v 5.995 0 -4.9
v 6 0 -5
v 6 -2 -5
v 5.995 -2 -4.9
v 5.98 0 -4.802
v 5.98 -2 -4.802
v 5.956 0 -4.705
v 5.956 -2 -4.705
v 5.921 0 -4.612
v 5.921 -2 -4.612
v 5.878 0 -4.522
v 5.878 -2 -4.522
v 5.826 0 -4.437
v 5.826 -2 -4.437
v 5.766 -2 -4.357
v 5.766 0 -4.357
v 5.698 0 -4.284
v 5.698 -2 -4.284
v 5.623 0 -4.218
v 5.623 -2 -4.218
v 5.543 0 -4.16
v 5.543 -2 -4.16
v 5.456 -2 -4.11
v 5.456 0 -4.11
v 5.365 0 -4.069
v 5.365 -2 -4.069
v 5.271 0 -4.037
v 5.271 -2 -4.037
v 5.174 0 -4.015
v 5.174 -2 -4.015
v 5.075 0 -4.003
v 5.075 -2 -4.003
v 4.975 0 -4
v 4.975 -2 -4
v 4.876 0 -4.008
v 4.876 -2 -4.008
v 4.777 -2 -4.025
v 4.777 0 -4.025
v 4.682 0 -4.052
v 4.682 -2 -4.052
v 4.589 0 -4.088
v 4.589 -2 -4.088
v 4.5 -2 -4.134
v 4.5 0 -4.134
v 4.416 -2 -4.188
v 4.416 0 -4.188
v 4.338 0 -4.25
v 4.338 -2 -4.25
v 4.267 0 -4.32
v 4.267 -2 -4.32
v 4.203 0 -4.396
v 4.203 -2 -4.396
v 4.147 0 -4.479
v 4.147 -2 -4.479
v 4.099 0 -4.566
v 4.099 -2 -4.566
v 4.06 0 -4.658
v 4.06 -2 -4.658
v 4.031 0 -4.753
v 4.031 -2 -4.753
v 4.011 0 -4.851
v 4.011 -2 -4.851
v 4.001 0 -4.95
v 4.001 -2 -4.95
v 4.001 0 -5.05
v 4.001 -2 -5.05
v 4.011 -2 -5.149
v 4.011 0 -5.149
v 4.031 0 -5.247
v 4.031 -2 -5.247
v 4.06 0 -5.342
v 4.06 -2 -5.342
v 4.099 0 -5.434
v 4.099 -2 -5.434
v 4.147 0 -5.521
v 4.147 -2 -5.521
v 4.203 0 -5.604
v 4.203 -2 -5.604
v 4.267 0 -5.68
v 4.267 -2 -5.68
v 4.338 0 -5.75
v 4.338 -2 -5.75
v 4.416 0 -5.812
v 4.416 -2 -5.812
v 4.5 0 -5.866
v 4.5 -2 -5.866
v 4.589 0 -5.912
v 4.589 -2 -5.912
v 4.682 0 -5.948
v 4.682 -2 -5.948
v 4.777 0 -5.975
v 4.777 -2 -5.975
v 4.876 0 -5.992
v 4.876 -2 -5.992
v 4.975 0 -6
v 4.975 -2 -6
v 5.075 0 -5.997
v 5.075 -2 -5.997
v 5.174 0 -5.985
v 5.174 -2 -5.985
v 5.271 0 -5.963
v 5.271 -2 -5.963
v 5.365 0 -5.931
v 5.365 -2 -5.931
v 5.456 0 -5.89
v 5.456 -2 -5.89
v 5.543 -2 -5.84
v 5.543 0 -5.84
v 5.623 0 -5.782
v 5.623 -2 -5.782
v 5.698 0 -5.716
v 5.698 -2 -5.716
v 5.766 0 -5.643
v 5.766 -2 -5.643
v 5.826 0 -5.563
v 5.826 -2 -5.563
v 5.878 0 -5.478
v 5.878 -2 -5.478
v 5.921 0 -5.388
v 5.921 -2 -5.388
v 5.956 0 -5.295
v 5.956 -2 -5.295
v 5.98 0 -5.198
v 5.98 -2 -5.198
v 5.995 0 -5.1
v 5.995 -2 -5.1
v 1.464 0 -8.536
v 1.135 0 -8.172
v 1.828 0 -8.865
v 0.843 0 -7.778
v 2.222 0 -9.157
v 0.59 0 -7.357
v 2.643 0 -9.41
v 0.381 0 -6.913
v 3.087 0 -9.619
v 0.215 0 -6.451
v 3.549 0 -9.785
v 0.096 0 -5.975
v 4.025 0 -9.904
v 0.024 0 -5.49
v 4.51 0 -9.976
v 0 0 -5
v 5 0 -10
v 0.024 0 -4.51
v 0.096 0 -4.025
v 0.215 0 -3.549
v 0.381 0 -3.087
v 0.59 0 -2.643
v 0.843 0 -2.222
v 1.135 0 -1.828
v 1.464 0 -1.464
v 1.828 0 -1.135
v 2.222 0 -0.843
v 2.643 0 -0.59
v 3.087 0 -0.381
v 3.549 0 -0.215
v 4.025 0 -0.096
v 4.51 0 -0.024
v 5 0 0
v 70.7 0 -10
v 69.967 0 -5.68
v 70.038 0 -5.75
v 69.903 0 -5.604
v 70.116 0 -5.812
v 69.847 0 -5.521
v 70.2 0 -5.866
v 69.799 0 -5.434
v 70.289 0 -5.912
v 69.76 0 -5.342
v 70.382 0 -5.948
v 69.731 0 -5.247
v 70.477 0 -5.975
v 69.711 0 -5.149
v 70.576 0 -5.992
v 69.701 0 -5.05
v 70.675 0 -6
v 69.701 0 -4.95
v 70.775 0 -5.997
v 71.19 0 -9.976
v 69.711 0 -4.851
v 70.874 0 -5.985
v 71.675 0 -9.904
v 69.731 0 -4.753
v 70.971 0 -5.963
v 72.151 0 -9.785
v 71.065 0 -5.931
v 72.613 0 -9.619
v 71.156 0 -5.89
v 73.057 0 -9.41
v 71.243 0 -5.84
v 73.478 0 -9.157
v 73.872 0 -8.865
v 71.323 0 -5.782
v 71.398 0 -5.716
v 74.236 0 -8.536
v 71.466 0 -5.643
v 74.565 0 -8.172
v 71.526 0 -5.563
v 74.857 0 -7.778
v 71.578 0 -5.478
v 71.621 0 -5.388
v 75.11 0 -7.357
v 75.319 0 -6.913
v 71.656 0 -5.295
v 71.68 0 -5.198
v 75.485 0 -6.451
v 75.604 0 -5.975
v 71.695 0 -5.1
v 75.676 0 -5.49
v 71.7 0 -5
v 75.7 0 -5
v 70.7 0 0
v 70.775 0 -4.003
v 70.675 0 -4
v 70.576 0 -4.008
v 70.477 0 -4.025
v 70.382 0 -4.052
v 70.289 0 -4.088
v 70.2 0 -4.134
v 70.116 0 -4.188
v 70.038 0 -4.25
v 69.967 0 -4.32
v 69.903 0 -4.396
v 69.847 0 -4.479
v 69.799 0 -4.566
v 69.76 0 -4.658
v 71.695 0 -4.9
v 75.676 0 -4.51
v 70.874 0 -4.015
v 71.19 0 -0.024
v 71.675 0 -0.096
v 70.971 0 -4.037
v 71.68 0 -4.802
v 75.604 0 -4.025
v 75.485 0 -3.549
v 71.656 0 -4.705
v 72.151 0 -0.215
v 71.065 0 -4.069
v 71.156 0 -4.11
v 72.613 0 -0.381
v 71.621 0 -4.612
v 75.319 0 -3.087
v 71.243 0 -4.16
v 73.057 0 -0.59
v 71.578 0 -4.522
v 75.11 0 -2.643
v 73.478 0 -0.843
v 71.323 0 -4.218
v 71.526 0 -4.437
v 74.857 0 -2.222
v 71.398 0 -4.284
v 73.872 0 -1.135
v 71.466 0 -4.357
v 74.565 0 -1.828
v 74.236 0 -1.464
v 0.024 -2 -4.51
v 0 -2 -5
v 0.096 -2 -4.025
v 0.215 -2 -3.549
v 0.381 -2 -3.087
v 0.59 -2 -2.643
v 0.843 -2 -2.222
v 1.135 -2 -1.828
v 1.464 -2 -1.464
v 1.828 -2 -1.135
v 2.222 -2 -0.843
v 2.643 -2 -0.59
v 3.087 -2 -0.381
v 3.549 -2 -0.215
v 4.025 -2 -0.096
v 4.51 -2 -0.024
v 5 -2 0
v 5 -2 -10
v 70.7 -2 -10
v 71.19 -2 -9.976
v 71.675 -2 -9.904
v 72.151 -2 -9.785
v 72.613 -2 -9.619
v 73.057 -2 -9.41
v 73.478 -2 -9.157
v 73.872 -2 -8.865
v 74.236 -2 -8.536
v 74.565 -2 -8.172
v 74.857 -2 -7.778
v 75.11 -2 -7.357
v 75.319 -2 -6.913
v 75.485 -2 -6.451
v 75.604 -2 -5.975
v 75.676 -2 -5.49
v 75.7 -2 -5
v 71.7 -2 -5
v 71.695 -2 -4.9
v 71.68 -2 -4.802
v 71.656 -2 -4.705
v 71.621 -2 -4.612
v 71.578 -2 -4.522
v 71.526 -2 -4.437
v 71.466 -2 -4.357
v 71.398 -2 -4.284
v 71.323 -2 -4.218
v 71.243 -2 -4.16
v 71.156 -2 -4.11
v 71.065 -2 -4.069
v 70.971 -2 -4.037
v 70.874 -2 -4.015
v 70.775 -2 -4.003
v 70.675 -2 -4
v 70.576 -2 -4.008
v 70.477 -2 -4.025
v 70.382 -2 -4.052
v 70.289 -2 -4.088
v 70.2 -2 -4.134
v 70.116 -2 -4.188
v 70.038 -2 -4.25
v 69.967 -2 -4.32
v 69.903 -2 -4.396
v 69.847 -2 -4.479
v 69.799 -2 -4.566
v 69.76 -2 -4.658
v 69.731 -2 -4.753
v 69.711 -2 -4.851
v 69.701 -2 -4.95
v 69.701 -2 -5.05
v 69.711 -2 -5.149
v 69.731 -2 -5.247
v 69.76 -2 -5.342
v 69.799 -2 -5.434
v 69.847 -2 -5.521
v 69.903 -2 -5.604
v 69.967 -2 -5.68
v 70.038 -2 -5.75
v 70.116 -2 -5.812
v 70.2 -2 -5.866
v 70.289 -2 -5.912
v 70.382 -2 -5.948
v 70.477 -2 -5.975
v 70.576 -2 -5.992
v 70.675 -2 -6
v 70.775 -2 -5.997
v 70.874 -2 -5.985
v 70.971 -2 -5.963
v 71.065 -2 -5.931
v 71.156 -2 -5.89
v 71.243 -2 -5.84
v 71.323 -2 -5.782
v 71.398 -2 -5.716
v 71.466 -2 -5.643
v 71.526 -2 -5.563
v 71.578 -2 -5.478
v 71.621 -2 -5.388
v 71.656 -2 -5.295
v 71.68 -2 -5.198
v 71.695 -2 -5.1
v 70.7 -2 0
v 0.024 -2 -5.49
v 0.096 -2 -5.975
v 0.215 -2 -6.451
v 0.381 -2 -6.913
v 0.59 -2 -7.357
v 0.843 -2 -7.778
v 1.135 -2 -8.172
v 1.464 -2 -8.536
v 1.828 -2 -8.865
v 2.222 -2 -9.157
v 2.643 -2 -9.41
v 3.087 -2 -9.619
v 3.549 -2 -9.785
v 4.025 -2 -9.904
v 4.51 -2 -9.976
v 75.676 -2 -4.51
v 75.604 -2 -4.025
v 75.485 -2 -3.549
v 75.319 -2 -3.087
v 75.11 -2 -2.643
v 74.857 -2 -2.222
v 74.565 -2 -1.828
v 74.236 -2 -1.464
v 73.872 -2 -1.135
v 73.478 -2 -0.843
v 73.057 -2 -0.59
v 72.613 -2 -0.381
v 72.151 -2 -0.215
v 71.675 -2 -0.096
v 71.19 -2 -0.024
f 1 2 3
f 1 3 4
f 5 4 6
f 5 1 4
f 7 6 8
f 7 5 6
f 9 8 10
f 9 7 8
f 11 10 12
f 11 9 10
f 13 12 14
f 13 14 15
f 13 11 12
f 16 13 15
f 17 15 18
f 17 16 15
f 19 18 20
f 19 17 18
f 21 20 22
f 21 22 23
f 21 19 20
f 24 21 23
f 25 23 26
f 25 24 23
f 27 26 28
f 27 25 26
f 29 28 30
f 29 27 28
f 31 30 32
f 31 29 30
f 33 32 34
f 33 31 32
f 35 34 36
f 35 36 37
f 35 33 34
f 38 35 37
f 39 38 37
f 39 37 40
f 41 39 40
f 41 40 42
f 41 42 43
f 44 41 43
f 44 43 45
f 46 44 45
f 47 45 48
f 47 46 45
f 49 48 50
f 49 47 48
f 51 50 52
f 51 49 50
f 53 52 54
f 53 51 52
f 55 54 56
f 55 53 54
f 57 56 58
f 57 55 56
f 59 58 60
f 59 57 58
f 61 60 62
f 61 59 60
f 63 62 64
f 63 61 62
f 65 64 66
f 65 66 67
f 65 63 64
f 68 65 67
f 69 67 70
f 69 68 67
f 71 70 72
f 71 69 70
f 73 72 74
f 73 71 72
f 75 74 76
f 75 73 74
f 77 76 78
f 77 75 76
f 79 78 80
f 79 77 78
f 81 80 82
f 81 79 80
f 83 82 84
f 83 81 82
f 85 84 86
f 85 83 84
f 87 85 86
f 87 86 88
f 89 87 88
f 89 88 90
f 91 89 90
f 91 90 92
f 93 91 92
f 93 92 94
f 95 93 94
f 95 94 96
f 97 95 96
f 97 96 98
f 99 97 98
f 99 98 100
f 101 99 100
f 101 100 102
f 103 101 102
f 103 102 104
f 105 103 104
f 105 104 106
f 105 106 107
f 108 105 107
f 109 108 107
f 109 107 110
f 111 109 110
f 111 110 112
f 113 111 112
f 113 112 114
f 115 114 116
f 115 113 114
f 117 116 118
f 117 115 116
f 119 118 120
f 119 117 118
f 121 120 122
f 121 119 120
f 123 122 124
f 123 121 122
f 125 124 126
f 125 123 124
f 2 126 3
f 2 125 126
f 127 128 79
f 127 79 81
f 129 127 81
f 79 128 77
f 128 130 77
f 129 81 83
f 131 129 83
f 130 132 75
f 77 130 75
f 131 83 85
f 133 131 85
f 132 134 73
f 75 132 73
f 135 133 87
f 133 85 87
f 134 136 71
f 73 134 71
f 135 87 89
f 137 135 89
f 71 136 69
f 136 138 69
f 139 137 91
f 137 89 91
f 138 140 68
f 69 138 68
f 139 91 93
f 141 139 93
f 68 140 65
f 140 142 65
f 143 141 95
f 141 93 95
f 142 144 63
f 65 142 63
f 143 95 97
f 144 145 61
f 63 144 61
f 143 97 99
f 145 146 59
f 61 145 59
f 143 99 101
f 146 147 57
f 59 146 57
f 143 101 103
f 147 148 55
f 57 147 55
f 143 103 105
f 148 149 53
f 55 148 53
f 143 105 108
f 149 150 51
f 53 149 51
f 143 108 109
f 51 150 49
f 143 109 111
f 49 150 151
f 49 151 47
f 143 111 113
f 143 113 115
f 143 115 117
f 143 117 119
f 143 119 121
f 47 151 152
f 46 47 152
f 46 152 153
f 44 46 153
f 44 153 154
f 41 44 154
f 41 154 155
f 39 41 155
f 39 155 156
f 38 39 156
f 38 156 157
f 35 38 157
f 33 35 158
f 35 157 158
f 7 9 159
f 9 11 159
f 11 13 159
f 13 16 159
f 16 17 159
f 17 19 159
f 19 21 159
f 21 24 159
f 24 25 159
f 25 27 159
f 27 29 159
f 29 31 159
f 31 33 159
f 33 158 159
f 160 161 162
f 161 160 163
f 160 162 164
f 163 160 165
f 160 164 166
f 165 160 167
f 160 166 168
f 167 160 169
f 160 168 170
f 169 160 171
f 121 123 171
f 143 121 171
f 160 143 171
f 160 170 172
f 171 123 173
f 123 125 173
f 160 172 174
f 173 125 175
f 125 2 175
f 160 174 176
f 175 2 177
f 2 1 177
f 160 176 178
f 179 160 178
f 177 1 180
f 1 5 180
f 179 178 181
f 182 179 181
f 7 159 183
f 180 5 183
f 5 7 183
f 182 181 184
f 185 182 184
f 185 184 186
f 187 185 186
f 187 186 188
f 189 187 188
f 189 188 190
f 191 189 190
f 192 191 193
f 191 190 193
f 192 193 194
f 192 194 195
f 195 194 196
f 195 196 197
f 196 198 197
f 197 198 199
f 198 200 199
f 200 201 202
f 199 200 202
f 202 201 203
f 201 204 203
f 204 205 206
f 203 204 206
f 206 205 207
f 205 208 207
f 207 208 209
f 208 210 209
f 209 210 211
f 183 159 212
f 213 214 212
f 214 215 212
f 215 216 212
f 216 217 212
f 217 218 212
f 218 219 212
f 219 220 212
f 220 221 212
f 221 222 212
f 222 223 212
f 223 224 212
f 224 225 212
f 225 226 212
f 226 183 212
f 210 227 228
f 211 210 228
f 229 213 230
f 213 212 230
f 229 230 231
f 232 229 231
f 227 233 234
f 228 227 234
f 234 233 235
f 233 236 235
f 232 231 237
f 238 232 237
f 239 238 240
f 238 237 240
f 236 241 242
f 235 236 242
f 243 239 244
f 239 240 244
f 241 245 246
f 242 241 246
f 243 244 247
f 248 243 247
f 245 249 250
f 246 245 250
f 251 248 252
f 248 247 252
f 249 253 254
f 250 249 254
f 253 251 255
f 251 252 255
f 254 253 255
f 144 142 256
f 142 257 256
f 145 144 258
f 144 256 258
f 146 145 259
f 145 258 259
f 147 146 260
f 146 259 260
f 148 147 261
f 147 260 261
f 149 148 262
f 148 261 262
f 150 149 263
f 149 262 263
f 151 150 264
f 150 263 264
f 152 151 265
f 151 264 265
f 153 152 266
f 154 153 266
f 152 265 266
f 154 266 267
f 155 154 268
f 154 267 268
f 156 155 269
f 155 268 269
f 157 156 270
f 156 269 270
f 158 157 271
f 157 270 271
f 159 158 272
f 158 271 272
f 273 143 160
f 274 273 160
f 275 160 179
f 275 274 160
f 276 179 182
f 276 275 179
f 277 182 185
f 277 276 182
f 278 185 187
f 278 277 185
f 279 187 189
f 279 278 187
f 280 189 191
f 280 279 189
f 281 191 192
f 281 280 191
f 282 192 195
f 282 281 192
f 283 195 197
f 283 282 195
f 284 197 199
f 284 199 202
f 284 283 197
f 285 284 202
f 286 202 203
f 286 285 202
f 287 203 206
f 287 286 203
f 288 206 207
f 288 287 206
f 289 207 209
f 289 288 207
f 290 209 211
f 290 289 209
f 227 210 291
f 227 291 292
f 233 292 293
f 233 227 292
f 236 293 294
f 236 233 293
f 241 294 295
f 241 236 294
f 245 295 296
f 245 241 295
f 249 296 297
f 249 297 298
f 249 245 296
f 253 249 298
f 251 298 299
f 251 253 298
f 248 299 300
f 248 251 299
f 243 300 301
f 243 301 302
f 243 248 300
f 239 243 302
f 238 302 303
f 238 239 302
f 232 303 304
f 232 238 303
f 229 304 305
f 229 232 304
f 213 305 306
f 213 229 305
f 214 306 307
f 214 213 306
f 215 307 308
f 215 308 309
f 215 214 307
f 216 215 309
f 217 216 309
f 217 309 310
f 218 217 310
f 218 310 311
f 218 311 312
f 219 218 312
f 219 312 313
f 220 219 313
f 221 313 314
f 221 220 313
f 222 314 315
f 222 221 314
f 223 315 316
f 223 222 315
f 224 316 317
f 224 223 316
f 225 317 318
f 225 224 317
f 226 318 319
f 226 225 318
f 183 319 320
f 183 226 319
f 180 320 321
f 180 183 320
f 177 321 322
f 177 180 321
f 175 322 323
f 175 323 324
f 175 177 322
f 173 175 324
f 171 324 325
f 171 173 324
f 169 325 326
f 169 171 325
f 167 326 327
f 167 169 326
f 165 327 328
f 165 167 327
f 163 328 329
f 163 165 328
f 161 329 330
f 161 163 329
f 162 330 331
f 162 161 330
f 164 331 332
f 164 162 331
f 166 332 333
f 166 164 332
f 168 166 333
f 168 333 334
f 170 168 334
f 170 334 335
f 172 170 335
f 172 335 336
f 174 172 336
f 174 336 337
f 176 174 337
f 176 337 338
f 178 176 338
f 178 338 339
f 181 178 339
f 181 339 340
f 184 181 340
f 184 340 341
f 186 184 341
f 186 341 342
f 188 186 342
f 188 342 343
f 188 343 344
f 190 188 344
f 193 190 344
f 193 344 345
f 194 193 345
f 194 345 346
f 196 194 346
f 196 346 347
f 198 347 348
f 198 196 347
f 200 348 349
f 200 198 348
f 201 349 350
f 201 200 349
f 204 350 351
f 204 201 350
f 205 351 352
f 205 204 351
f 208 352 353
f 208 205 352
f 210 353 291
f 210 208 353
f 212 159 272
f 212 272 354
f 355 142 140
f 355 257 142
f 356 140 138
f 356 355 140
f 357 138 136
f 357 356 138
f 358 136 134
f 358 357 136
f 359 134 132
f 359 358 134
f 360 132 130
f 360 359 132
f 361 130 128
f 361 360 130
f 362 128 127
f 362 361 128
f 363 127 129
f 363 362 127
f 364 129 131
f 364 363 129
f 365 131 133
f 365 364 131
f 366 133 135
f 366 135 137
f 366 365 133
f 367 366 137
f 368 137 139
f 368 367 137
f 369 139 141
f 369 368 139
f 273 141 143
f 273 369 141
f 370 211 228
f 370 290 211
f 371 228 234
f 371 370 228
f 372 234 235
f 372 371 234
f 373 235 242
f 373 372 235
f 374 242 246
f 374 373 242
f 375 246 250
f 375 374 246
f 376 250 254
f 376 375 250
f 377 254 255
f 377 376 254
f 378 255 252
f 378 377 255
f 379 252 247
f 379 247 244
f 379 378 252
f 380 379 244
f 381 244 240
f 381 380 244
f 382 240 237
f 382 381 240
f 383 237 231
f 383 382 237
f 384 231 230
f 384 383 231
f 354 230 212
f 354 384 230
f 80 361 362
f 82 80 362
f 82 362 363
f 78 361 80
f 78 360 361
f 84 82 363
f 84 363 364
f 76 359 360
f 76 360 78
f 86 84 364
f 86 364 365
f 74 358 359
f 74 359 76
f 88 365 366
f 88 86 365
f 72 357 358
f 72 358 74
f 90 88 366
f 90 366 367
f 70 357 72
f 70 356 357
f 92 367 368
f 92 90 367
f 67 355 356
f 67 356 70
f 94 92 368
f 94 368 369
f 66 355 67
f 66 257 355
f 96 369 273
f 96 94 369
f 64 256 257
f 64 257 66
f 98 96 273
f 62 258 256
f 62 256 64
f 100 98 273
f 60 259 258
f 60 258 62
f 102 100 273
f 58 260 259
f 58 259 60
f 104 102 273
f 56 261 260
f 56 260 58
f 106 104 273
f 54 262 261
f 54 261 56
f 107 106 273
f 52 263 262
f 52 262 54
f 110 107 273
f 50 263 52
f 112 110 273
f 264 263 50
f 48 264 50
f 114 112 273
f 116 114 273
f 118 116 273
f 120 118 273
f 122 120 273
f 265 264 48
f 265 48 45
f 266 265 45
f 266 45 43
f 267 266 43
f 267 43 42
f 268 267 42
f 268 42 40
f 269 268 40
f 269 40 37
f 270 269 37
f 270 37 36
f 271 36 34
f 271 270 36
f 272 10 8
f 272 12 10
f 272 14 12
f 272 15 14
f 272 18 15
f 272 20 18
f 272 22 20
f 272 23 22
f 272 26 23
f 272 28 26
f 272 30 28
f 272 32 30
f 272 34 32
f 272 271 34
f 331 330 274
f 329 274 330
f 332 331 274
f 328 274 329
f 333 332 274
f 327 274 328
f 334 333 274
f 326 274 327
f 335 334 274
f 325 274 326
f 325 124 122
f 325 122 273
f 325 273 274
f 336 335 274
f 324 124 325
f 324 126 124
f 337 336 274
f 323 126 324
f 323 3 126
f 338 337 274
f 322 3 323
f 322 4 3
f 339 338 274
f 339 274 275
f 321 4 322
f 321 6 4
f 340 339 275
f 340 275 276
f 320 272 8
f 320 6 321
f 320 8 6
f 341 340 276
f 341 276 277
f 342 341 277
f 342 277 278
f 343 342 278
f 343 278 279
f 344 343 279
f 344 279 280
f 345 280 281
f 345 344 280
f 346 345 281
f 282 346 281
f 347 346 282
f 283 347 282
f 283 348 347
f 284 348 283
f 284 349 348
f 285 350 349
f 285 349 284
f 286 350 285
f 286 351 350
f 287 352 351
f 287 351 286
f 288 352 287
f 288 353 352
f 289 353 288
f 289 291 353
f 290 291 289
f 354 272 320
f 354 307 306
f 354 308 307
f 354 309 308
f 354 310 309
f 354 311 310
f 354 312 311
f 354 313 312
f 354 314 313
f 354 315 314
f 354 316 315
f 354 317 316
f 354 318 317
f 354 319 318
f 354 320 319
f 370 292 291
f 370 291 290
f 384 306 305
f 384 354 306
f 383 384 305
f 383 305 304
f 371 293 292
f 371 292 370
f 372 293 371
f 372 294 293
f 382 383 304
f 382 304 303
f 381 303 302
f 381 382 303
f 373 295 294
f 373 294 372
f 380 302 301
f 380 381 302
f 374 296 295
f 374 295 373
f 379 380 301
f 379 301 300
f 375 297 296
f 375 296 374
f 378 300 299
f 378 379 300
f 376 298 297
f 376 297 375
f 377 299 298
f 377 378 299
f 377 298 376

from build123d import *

# Parameters (mm, degrees)
F0_W     = 75.7
F0_H     = 10
F0_R     = 1
F1_DEPTH = 2
F2_R     = 5
F3_R     = 4.99999
F4_R     = 5
F5_R     = 4.99999


# Not quite as in the source:
# - a fillet or chamfer is up to 0.001 mm smaller than in the source, because OpenCascade refuses the exact size


with BuildPart() as f1:
    # F0 (on Front) → F1 (new body)
    with BuildSketch(Plane.XZ):
        with Locations((37.85, -5)):
            Rectangle(F0_W, F0_H)
        with Locations((5, -5)):
            Circle(F0_R, mode=Mode.SUBTRACT)
        with Locations((70.7, -5)):
            Circle(F0_R, mode=Mode.SUBTRACT)
    extrude(amount=F1_DEPTH)

    # F2
    f2_edges = [f1.edges().sort_by_distance(p)[0] for p in [
        (0, -1, 0),
    ]]
    fillet(f2_edges, radius=F2_R)

    # F3 (radius 5 in the source; OpenCascade refuses exactly that, so slightly less here)
    f3_edges = [f1.edges().sort_by_distance(p)[0] for p in [
        (0, -1, -10),
    ]]
    fillet(f3_edges, radius=F3_R)

    # F4
    f4_edges = [f1.edges().sort_by_distance(p)[0] for p in [
        (75.7, -1, -10),
    ]]
    fillet(f4_edges, radius=F4_R)

    # F5 (radius 5 in the source; OpenCascade refuses exactly that, so slightly less here)
    f5_edges = [f1.edges().sort_by_distance(p)[0] for p in [
        (75.7, -1, 0),
    ]]
    fillet(f5_edges, radius=F5_R)


solid = f1.part
